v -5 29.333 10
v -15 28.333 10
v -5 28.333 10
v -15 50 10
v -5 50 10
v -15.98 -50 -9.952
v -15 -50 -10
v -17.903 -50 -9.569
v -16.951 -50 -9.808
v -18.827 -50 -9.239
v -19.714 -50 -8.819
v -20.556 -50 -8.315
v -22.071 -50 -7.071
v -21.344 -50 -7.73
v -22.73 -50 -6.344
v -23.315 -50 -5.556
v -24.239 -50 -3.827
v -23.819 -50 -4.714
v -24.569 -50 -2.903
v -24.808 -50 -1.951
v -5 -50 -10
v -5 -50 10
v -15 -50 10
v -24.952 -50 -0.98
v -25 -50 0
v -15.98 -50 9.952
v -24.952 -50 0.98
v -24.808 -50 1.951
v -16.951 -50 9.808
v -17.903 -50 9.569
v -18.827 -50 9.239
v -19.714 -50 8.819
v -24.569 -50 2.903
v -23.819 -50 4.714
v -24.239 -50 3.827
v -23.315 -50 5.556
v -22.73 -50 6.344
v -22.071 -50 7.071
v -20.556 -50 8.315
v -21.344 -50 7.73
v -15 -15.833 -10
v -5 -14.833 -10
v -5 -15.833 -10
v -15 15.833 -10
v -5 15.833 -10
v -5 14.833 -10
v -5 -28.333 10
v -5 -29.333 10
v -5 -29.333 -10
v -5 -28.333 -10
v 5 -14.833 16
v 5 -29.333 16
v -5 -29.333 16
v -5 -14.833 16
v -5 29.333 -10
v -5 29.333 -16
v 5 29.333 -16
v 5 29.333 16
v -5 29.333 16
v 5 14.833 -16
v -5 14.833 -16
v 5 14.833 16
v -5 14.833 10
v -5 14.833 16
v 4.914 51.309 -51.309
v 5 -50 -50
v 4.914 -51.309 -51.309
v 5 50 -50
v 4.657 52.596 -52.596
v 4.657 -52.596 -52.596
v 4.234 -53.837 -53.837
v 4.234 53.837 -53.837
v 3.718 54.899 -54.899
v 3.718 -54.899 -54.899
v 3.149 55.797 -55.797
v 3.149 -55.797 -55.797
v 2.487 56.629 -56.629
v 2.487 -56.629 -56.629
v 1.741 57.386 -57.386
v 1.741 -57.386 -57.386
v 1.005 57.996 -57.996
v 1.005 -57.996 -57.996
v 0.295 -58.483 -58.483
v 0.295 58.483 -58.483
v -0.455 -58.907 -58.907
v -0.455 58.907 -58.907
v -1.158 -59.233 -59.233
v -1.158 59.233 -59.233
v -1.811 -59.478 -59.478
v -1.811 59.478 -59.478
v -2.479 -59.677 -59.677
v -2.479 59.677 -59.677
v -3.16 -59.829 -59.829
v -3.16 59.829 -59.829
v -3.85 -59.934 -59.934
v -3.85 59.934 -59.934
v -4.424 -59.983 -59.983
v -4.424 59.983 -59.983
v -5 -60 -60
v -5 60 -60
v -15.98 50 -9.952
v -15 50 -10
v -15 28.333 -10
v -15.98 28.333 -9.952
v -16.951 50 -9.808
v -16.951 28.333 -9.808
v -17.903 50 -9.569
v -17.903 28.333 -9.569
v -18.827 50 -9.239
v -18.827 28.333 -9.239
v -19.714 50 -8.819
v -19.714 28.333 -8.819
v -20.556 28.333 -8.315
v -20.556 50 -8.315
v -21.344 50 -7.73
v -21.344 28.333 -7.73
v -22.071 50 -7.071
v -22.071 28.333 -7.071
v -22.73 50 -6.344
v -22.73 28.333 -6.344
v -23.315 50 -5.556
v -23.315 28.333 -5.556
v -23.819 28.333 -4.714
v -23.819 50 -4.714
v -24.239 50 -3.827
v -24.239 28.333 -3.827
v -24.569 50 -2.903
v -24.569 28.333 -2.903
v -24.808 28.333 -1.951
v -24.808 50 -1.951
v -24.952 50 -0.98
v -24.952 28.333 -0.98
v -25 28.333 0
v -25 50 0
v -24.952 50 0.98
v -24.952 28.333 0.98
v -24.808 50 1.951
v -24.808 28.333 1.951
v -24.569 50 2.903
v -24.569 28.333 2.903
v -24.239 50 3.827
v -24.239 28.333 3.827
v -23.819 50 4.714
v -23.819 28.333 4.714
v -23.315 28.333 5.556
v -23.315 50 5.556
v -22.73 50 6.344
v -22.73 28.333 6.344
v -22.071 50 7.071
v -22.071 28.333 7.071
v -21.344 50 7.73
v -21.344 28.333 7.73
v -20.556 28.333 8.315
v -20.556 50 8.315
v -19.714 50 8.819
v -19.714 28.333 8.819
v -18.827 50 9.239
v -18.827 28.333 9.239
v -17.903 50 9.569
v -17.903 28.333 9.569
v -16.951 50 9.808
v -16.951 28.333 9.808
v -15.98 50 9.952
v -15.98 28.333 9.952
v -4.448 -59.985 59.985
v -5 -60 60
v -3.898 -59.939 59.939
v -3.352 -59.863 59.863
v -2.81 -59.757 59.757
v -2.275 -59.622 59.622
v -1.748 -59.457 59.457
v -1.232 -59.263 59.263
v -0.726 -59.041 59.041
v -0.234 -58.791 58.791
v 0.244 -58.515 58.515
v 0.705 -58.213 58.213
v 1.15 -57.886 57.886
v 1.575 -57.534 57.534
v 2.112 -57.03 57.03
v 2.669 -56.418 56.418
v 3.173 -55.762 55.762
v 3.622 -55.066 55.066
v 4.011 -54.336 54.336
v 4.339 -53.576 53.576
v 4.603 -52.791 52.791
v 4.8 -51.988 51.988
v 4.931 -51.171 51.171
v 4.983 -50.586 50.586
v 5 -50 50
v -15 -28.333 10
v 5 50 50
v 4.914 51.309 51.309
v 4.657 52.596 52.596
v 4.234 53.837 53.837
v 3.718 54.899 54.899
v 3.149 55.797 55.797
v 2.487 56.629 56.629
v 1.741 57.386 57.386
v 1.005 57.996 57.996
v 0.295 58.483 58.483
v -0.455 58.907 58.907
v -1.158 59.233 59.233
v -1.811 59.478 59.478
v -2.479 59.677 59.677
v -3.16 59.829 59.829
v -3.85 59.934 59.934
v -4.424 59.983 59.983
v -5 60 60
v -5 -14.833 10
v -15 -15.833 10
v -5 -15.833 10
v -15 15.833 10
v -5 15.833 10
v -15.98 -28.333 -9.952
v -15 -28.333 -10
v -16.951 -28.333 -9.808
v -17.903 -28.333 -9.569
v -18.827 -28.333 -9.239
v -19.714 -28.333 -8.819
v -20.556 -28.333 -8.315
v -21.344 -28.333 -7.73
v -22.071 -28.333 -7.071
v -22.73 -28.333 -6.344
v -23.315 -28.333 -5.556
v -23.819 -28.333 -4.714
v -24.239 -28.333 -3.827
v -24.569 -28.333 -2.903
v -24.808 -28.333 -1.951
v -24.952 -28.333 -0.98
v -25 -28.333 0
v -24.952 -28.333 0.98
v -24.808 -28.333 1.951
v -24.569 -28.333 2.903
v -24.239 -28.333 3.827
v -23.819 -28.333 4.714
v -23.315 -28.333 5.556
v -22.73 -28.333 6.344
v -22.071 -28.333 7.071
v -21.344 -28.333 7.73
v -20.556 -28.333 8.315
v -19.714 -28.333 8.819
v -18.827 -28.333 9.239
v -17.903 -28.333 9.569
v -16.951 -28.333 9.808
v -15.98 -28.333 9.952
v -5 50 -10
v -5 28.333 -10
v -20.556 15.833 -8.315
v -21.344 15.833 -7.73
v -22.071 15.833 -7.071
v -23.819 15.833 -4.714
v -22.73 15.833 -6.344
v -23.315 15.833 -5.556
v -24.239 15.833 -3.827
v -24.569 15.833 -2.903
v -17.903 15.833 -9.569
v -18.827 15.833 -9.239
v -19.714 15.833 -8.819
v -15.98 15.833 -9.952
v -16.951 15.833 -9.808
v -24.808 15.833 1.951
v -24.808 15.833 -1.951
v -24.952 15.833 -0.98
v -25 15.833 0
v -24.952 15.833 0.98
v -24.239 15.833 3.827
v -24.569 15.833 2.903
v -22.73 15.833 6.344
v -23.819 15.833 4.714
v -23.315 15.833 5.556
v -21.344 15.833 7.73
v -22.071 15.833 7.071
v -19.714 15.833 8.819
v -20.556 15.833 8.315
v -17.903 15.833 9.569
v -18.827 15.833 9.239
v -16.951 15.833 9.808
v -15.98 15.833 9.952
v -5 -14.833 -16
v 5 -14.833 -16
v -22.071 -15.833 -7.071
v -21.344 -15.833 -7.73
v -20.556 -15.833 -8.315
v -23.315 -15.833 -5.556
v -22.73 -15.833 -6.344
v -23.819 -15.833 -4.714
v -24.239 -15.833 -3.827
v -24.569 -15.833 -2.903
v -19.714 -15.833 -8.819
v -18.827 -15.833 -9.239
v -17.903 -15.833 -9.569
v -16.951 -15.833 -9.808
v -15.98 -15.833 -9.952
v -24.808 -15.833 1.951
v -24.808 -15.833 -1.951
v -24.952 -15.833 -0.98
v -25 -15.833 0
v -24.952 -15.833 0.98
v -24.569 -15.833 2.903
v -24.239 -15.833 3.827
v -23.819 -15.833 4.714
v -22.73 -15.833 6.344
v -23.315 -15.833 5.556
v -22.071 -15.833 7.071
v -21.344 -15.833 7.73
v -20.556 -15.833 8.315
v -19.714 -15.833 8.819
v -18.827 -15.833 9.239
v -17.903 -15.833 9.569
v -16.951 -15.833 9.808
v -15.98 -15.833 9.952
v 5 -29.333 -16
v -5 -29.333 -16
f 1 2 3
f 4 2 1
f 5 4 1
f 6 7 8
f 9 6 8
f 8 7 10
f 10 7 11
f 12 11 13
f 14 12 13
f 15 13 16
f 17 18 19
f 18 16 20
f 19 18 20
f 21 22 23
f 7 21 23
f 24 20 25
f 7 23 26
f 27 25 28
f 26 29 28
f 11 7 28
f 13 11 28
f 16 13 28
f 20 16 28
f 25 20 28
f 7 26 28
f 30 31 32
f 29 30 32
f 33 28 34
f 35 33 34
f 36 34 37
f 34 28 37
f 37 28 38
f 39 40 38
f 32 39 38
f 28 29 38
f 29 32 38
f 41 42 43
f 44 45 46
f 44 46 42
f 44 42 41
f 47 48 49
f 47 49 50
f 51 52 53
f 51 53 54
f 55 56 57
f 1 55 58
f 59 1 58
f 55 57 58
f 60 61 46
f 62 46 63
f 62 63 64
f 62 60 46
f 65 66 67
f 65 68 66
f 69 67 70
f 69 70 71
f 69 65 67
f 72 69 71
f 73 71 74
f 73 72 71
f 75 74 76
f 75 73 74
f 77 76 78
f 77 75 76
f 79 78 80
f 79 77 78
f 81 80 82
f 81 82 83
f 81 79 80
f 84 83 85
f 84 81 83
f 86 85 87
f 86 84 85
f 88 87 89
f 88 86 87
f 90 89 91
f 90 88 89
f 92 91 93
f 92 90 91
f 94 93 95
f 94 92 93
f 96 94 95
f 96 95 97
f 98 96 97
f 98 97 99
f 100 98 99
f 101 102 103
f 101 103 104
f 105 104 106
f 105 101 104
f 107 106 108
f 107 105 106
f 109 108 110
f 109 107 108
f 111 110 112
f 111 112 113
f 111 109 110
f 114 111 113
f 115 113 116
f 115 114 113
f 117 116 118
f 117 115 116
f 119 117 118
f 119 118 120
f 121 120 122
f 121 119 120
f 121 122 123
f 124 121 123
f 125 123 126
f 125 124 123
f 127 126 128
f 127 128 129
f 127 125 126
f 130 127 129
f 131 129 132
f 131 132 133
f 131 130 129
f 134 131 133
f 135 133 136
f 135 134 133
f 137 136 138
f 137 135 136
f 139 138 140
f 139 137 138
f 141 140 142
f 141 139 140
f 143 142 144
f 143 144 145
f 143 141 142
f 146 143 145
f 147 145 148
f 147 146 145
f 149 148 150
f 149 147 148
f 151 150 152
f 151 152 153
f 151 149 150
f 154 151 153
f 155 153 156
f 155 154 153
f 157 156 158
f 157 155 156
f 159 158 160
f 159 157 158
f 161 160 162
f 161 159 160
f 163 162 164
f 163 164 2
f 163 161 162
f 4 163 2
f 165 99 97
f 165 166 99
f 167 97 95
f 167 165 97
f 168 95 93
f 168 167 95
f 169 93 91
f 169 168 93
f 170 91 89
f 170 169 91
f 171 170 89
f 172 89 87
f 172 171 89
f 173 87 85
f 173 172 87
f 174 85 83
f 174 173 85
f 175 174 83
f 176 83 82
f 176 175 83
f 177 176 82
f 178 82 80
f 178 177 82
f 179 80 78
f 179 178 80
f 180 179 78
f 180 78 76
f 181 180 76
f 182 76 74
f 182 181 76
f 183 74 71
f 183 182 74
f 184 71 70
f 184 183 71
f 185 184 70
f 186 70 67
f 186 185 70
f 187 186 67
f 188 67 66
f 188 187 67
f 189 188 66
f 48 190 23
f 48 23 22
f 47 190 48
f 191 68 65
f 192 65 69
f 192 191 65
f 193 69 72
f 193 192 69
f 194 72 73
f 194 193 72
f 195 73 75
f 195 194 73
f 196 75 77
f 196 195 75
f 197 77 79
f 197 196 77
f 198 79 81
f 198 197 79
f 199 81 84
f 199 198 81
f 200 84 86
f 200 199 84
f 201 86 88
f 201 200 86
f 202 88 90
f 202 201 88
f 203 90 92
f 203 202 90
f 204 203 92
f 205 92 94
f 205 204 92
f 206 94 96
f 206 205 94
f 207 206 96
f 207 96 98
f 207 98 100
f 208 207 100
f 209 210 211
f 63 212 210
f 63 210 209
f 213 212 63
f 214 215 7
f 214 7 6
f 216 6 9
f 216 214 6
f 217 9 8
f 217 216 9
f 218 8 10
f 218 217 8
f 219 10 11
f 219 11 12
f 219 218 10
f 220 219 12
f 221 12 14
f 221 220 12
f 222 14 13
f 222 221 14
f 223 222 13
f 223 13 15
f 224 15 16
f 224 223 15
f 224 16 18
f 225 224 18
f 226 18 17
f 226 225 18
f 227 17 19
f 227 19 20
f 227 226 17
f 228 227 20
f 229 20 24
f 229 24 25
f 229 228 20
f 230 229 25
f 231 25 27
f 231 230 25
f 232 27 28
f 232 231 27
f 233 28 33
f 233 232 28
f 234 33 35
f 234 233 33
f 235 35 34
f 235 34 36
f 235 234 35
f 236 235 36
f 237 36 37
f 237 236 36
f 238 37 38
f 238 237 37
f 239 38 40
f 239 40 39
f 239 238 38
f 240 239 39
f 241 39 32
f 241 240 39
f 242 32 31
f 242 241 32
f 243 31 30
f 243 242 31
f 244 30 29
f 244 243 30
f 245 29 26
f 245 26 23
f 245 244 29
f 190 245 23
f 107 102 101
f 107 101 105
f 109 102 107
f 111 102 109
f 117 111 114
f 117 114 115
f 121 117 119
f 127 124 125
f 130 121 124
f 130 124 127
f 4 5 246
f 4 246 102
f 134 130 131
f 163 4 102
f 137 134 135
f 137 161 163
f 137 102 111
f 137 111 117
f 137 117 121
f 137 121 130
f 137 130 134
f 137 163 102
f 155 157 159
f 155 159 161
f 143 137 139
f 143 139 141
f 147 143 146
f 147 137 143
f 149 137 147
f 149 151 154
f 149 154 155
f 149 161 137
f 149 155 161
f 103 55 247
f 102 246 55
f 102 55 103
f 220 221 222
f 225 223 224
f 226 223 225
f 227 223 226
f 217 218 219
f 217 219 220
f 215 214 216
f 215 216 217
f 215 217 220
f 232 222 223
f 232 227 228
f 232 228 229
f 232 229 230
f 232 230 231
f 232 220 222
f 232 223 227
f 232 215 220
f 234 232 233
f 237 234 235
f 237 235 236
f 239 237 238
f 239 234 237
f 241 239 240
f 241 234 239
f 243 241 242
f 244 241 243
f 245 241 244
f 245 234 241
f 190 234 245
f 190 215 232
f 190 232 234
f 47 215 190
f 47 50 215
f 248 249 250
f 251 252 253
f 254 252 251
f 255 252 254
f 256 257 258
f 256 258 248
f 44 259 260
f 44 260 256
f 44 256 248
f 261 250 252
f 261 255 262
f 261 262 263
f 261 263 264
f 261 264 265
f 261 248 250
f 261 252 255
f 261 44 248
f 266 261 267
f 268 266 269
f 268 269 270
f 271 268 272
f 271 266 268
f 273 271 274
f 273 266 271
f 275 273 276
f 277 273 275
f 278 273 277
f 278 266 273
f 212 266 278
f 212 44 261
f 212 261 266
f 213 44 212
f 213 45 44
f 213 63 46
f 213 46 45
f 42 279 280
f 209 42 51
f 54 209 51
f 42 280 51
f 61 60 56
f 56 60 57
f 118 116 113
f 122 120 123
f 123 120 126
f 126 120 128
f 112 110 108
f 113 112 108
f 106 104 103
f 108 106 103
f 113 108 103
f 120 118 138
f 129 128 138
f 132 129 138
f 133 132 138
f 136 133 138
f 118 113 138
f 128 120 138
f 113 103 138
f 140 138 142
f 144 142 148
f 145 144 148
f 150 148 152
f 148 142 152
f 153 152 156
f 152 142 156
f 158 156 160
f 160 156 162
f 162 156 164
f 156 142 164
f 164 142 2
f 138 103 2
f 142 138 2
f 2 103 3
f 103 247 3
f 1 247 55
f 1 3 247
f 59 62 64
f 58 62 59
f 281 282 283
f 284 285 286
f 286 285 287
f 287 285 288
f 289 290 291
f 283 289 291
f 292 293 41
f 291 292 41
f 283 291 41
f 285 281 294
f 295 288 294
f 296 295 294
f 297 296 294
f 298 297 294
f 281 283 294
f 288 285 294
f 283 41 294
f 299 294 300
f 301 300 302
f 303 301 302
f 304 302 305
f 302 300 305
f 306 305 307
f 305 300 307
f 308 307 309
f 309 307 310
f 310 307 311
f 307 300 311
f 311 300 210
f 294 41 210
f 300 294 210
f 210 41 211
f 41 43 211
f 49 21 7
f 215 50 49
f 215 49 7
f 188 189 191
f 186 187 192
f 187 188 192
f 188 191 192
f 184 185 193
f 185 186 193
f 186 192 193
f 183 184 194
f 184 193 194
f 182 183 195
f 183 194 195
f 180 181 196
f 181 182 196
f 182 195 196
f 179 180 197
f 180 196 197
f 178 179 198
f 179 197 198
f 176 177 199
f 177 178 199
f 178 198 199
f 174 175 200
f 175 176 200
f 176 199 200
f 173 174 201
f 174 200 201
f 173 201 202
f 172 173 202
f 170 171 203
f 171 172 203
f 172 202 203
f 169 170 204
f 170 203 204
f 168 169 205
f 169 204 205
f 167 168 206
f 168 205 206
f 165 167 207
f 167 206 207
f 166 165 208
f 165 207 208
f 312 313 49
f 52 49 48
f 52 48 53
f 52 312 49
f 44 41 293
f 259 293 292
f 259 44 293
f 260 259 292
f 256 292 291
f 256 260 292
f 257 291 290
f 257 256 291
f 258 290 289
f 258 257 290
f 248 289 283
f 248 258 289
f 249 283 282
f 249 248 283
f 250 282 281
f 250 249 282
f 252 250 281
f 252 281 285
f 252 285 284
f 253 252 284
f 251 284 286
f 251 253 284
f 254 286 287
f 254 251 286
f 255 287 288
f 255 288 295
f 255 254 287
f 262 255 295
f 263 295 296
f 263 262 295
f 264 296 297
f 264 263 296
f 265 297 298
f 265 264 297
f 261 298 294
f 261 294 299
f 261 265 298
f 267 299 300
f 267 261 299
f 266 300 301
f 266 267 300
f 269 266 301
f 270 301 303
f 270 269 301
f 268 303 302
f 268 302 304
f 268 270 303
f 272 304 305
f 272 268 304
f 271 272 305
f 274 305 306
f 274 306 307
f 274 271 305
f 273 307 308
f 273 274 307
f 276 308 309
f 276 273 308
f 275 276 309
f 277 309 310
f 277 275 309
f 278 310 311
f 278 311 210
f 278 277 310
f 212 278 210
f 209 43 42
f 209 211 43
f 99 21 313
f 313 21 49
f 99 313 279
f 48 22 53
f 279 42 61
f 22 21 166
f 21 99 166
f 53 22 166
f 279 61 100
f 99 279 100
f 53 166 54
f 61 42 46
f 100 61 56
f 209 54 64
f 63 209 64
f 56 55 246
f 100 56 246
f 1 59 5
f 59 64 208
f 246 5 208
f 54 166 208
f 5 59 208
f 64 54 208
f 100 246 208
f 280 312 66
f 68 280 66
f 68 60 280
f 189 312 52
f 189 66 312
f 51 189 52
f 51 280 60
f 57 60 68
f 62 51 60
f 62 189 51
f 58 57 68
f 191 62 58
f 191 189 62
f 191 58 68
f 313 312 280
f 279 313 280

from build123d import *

# Parameters (mm, degrees)
SKETCH2_W           = 120
SKETCH2_H           = 120
BOSS_EXTRUDE1_DEPTH = 5
FILLET1_R           = 10
BOSS_EXTRUDE2_DEPTH = 50
SKETCH3_W           = 12.5
SKETCH3_H           = 30
CUT_EXTRUDE1_DEPTH  = 91
SKETCH5_W           = 14.5
SKETCH5_H           = 32
CUT_EXTRUDE2_DEPTH  = 10


with BuildPart() as part:
    # Sketch2 → Boss-Extrude1 (new, symmetric)
    with BuildSketch(Plane.YZ):
        Rectangle(SKETCH2_W, SKETCH2_H)
    extrude(amount=BOSS_EXTRUDE1_DEPTH, both=True)

    # Fillet1
    fillet1_edges = [part.edges().sort_by_distance(p)[0] for p in [
        (5, 60, 0),
        (5, 0, -60),
        (5, -60, 0),
        (5, 0, 60),
    ]]
    fillet(fillet1_edges, radius=FILLET1_R - 0.0001)  # a hair under: the kernel refuses the full size

    # Sketch4 → Boss-Extrude2 (add, symmetric)
    with BuildSketch(Plane(origin=(0, 0, 0), x_dir=(-1, 0, 0), z_dir=(0, 1, 0))):
        with BuildLine():
            Line((15, 10), (5, 10))
            Line((5, 10), (5, -10))
            Line((5, -10), (15, -10))
            ThreePointArc((15, -10), (25, 0), (15, 10))
        make_face()
    extrude(amount=BOSS_EXTRUDE2_DEPTH, both=True)

    # Sketch3 → Cut-Extrude1 (cut, through all)
    with BuildSketch(Plane.YZ.offset(5)):
        with Locations((-22.083333333, 0)):
            Rectangle(SKETCH3_W, SKETCH3_H)
        with Locations((22.083333333, 0)):
            Rectangle(SKETCH3_W, SKETCH3_H)
    extrude(amount=-CUT_EXTRUDE1_DEPTH, mode=Mode.SUBTRACT)

    # Sketch5 → Cut-Extrude2 (cut)
    with BuildSketch(Plane.YZ.offset(5)):
        with Locations((22.083333333, 0)):
            Rectangle(SKETCH5_W, SKETCH5_H)
        with Locations((-22.083333333, 0)):
            Rectangle(SKETCH5_W, SKETCH5_H)
    extrude(amount=-CUT_EXTRUDE2_DEPTH, mode=Mode.SUBTRACT)


solid = part.part
